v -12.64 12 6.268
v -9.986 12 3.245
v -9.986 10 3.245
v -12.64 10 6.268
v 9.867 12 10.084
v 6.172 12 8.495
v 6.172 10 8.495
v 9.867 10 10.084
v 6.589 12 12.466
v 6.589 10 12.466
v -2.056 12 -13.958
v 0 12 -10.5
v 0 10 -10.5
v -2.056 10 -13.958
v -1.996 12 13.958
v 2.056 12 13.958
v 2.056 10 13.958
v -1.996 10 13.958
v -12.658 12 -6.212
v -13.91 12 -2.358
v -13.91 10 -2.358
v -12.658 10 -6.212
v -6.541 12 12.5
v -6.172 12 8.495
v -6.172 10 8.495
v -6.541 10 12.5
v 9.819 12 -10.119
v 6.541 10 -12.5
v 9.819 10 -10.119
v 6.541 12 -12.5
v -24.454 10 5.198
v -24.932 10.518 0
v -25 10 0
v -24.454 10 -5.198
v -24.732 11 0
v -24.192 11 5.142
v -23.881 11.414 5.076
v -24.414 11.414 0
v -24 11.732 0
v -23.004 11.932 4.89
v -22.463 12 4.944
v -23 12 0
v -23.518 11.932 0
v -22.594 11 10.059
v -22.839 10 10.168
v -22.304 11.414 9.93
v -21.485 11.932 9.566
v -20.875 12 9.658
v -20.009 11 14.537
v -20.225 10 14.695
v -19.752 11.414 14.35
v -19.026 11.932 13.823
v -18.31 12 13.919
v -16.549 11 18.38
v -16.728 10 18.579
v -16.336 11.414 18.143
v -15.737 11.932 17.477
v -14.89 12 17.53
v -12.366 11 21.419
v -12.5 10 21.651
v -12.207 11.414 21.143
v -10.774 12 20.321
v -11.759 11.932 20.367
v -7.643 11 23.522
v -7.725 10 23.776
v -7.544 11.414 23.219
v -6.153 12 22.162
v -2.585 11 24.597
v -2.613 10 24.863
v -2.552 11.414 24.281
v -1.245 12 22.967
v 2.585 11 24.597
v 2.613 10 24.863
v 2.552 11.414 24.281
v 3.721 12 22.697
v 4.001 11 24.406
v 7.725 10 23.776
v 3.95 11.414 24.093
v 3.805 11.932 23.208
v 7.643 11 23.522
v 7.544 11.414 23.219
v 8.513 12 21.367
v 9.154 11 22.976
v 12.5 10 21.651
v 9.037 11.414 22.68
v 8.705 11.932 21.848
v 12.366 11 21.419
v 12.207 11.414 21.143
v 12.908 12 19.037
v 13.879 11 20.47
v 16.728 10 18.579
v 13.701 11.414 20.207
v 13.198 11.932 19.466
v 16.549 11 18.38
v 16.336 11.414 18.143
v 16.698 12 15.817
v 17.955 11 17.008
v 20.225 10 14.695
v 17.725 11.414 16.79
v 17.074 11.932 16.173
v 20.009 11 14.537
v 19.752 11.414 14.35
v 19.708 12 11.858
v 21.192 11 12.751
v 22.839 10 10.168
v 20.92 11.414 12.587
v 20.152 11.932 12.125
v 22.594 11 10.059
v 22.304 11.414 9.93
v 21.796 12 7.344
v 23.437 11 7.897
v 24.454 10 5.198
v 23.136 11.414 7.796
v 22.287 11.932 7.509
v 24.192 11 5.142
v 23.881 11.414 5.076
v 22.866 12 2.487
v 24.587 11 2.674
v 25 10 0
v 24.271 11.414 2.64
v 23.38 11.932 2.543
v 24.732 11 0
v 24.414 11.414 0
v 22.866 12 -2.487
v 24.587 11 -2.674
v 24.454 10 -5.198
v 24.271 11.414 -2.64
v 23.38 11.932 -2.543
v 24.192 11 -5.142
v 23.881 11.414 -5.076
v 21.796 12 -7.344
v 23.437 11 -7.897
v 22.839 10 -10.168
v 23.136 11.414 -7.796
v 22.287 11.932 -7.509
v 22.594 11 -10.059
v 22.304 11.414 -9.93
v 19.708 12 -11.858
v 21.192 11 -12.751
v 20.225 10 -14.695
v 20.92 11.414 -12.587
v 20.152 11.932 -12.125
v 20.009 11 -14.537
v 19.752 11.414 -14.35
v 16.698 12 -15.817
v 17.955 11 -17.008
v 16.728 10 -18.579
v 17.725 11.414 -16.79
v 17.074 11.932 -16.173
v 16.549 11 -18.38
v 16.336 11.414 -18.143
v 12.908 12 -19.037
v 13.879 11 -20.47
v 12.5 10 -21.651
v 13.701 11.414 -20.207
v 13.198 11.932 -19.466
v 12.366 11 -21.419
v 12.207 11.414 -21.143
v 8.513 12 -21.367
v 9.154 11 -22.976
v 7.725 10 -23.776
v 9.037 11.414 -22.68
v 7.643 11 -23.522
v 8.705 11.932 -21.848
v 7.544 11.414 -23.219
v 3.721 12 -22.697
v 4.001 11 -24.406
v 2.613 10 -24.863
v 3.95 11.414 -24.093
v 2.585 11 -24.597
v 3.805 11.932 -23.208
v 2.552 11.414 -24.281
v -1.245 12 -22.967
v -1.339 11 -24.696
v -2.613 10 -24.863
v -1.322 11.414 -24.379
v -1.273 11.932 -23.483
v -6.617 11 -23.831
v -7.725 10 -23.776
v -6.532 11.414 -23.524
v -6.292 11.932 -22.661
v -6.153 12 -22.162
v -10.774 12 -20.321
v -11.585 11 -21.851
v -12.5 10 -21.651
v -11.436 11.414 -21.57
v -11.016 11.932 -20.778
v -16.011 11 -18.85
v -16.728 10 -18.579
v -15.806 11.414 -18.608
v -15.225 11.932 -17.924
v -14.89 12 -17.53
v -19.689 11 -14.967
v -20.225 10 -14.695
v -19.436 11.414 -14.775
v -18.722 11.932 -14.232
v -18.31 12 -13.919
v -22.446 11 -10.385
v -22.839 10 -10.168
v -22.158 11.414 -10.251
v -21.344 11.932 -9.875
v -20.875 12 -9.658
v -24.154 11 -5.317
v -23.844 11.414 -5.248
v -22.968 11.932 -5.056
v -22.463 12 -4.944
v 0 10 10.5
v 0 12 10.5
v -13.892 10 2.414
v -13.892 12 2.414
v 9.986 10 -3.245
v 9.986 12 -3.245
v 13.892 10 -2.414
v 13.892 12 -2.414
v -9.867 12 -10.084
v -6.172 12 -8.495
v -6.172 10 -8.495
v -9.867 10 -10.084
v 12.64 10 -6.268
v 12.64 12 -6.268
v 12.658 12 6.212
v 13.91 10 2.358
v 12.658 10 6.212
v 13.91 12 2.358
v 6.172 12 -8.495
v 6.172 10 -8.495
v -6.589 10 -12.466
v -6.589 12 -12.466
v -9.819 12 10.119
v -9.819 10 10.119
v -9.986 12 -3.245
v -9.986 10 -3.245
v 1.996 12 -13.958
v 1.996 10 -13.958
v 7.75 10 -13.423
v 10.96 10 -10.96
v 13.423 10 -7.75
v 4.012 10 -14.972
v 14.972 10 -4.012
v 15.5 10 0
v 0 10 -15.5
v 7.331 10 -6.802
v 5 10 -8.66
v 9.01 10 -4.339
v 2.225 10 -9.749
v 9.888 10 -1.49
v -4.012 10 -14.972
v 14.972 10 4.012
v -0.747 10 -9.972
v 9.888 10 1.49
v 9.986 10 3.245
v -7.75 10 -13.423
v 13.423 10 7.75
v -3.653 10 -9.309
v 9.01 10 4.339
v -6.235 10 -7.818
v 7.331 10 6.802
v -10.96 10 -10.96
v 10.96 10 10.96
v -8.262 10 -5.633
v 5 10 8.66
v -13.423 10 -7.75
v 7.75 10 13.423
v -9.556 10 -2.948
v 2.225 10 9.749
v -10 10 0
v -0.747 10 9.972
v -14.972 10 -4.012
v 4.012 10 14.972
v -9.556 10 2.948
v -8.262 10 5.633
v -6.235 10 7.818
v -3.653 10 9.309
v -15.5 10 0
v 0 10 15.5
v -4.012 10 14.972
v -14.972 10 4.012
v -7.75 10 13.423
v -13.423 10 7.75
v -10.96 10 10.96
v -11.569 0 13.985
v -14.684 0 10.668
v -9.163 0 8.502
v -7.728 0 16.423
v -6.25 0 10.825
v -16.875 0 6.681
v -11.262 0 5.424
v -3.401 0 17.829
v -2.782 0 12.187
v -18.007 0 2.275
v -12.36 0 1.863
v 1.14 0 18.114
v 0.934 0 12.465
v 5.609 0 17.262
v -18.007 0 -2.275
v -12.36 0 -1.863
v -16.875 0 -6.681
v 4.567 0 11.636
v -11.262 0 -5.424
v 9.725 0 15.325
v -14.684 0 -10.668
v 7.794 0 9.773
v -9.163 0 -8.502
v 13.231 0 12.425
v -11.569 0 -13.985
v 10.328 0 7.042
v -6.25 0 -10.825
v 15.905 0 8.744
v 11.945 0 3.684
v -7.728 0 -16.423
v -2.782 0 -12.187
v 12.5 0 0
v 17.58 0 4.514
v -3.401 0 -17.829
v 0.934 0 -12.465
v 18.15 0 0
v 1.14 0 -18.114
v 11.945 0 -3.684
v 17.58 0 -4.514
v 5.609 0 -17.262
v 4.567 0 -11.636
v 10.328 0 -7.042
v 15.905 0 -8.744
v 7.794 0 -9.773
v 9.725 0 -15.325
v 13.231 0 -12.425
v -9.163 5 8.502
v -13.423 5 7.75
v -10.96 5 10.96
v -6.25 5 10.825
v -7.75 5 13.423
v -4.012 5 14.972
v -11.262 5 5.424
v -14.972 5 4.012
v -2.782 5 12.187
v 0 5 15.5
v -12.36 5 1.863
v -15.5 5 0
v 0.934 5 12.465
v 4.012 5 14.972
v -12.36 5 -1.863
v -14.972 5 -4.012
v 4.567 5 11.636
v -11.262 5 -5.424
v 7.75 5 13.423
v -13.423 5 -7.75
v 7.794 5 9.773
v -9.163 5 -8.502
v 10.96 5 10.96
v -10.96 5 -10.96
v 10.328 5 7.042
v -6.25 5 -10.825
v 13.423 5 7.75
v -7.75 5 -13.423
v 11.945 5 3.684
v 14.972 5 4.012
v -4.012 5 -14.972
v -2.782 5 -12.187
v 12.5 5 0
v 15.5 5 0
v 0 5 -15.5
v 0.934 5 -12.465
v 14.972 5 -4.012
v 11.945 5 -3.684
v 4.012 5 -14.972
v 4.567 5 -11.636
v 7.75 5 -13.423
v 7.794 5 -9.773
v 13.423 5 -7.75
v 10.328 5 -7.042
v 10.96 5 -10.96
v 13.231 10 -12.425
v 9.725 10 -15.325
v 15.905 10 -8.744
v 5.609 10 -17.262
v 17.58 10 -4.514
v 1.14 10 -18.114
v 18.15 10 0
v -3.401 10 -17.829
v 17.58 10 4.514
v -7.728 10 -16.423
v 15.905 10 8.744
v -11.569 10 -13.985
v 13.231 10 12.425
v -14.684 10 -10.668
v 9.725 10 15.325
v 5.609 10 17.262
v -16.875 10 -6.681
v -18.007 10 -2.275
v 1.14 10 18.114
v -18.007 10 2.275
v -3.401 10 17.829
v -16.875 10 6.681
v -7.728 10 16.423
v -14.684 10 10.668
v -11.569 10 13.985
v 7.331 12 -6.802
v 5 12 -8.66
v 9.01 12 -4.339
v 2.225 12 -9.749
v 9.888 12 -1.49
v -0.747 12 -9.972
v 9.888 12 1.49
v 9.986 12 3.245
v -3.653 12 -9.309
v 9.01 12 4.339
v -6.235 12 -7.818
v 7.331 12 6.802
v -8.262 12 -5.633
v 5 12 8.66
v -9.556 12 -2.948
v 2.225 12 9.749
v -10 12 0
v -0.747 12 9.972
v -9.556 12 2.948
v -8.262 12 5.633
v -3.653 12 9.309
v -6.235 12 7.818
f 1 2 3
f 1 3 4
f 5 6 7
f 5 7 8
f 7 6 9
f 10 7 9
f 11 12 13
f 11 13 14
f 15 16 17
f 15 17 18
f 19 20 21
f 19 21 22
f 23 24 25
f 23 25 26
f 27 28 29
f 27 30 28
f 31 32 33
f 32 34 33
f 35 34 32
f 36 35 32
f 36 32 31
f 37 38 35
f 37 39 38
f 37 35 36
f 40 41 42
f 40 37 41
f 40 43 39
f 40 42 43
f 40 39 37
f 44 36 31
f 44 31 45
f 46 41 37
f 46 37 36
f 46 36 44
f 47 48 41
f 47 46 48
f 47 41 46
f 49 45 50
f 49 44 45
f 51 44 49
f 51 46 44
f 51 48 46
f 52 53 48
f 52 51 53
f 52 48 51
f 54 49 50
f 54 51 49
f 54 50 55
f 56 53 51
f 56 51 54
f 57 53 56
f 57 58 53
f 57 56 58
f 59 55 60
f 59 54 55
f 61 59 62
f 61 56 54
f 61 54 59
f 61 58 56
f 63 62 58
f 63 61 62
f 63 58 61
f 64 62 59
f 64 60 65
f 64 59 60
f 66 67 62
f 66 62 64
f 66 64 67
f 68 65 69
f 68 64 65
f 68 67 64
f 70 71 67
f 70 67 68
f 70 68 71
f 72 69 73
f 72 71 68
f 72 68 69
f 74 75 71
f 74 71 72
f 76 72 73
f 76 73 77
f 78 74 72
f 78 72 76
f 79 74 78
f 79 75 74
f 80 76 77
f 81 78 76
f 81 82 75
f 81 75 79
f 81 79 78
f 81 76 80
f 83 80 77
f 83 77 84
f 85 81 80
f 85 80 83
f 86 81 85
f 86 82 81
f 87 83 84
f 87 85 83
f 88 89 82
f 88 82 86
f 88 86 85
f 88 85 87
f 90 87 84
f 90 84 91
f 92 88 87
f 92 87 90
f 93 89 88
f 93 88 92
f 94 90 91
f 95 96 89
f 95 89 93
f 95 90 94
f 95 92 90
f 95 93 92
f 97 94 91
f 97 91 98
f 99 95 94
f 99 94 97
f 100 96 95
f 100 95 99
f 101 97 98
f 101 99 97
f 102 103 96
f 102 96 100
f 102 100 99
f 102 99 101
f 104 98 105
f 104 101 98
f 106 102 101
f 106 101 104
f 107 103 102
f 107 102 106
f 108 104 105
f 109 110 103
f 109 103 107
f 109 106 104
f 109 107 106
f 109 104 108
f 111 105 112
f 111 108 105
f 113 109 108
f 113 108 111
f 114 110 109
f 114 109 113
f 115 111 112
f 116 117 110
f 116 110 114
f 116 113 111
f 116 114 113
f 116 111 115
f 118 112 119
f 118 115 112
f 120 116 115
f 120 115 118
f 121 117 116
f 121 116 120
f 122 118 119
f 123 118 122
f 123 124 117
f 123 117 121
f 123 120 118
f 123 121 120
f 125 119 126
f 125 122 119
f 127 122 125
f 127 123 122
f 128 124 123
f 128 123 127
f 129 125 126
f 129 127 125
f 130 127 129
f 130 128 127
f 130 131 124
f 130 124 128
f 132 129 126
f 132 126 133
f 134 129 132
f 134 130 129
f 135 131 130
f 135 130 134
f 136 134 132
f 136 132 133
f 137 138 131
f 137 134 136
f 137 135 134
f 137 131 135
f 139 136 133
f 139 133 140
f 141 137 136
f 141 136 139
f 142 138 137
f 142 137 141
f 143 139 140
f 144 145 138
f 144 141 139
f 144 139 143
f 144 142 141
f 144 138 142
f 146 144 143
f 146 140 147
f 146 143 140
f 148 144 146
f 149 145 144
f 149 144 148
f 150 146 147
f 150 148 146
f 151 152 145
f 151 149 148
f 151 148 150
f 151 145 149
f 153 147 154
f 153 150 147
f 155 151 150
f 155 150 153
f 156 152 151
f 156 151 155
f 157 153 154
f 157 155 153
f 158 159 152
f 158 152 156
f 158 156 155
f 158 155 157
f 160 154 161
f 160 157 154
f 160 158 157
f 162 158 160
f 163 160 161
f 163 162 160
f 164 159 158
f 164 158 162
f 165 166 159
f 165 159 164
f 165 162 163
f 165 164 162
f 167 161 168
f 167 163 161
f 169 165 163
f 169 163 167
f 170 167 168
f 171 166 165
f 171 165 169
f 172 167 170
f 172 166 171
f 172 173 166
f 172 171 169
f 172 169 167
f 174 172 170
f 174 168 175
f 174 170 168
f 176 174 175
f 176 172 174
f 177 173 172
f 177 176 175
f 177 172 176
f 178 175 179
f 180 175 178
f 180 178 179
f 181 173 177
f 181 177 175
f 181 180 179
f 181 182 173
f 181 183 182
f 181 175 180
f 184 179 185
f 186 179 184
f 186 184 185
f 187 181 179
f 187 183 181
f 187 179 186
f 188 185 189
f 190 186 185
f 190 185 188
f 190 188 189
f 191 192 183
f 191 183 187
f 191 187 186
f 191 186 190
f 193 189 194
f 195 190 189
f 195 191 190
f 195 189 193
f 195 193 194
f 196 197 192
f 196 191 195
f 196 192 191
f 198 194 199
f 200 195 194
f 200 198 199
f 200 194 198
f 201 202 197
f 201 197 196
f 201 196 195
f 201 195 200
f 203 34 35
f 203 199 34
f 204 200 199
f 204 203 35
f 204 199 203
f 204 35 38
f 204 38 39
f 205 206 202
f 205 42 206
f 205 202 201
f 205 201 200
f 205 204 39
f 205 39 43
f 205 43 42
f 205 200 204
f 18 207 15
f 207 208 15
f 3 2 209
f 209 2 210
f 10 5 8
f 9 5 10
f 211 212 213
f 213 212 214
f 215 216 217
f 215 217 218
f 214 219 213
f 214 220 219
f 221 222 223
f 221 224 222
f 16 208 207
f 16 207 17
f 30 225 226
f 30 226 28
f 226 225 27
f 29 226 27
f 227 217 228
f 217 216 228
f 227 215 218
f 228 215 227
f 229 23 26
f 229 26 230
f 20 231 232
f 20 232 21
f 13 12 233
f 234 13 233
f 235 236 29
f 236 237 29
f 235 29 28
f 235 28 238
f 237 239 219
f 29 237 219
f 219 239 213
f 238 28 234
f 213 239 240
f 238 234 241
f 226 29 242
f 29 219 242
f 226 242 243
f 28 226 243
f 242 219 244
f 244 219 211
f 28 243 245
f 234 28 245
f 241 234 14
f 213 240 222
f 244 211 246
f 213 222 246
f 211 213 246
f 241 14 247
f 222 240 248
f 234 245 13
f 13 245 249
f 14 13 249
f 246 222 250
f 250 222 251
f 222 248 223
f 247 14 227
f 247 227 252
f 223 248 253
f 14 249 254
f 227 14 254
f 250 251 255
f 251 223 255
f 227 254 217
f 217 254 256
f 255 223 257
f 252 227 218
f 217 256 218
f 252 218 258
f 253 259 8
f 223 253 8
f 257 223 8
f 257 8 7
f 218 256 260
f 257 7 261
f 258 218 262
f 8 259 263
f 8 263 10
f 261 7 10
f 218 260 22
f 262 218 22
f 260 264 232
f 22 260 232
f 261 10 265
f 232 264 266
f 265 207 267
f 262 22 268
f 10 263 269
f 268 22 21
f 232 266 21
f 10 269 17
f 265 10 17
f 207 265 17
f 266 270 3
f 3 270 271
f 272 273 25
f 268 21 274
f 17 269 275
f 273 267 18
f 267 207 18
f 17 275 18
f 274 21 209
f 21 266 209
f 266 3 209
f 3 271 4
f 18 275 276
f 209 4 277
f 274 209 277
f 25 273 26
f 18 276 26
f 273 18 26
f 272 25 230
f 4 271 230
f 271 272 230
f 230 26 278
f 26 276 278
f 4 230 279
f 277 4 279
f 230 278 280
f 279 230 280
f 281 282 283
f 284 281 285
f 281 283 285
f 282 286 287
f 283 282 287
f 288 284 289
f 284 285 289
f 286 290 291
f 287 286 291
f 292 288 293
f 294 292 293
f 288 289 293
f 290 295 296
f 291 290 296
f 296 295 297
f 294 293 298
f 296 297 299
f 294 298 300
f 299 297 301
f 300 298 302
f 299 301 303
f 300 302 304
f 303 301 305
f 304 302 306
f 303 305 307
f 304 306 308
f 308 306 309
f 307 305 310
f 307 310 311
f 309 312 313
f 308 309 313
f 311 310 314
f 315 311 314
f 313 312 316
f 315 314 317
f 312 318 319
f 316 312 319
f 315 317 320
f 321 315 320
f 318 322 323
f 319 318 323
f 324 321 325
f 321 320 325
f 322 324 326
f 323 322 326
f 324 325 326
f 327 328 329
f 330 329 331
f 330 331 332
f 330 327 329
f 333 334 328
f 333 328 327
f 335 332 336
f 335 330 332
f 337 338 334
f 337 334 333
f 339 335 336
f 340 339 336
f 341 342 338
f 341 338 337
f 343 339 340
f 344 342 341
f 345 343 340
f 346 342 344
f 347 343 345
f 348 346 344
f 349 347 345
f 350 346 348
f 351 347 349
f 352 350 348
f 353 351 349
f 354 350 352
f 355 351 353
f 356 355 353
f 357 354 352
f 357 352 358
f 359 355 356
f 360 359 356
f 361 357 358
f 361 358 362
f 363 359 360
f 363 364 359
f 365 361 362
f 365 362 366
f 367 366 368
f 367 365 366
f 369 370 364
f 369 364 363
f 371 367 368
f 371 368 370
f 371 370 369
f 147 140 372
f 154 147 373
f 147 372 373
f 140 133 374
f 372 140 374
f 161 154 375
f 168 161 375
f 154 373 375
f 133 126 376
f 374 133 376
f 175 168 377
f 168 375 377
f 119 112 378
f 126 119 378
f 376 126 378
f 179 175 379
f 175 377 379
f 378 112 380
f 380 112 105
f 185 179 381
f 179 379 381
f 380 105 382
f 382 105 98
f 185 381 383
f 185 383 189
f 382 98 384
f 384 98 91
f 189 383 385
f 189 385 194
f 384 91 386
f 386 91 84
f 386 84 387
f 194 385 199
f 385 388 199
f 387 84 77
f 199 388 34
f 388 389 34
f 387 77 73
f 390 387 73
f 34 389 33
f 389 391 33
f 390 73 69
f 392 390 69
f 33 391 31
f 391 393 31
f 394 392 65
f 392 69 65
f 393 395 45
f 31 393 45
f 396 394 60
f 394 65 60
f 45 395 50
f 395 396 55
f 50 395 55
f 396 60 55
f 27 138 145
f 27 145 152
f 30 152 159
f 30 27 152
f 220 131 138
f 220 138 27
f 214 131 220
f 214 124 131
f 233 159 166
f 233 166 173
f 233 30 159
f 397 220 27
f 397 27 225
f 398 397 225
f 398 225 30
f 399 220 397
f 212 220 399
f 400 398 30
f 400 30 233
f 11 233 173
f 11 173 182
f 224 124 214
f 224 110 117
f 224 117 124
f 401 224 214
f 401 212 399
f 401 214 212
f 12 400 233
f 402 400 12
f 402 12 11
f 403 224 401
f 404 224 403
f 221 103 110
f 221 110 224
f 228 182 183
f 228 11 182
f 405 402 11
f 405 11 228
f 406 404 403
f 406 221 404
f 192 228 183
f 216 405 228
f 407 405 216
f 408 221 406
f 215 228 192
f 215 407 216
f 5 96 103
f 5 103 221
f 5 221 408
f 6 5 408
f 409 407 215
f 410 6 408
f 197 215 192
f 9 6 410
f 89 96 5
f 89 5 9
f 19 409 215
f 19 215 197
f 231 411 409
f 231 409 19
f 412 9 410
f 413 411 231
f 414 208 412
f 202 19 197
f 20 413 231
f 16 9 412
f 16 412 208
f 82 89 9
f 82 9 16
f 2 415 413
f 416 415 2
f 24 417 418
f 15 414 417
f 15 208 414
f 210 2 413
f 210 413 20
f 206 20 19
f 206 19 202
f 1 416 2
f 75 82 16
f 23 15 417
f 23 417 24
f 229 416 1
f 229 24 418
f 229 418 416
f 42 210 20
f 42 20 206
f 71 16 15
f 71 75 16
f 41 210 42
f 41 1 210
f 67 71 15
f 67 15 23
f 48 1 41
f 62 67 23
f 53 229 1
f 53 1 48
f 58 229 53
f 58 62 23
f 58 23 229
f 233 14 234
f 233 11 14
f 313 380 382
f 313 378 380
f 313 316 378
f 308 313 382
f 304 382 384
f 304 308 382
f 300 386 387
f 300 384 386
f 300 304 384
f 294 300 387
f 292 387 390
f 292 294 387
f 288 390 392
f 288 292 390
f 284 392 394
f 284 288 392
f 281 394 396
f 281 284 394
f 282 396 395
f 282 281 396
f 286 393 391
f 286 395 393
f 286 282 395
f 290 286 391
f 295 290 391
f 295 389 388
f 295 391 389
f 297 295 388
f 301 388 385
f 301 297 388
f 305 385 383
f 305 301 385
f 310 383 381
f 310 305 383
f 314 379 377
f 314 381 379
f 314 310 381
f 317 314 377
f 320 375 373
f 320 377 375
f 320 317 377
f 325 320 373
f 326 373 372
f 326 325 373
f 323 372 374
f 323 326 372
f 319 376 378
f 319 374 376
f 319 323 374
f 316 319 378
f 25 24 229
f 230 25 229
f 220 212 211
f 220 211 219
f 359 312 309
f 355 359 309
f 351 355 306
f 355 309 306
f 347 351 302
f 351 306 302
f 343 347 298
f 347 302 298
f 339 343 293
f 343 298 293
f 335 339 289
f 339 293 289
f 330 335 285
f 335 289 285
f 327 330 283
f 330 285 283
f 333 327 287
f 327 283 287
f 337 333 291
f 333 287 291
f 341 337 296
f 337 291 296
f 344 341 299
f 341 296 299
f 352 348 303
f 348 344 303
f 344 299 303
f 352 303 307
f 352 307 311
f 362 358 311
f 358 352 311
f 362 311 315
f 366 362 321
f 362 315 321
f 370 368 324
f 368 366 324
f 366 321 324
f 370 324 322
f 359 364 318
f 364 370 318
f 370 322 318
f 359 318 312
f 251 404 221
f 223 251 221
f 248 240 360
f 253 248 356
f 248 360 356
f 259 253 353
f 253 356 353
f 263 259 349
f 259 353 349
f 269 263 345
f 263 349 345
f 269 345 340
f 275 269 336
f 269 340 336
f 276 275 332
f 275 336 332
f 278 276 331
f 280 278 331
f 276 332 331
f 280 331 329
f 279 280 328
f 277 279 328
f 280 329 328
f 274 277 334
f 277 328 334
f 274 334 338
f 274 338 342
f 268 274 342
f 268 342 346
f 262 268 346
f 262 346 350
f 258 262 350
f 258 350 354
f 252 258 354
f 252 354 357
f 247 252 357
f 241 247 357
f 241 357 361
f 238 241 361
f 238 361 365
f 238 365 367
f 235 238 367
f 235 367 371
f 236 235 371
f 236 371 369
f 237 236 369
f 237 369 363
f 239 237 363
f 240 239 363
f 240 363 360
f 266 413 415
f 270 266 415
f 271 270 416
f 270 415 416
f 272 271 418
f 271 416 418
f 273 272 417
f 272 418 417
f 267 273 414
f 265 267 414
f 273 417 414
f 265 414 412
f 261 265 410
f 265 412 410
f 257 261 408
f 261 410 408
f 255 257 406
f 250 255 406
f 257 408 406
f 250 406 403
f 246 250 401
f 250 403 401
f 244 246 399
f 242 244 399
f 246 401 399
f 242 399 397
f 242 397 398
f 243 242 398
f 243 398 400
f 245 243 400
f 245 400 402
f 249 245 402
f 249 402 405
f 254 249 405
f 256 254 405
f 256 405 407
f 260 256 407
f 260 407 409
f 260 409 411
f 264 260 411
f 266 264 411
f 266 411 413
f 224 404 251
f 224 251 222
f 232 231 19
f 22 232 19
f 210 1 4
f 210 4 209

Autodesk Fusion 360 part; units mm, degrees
sketch "Esquisse1" plane through (0, 0, 0) normal (0, 1, 0) x (1, 0, 0)
  circle A0 centre (0, 0) radius 18.15
  circle A1 centre (0, 0) radius 15.5
  dimension "d1" = 36.3
  dimension "d2" = 31
extrude "Extrusion1" add sketch "Esquisse1" along normal blind 10 makes body 1
sketch "Esquisse2" plane through (0, 10, 0) normal (0, 1, 0) x (-1, 0, 0)
  circle A0 centre (0, 0) radius 15.5
  circle A1 centre (0, 0) radius 18.15
  circle A2 centre (0, 0) radius 25
  dimension "d5" = 50
extrude "Extrusion2" add sketch "Esquisse2" along normal blind 2 contours A1 | A2 bodies 1
sketch "Esquisse3" plane through (0, 0, 0) normal (0, 1, 0) x (1, 0, 0)
  circle A0 centre (0, 0) radius 16.65
  circle A1 centre (0, 0) radius 12.5
  dimension "d8" = 33.3
  dimension "d9" = 25
extrude "Extrusion3" add sketch "Esquisse3" along normal blind 5 bodies 1
sketch "Esquisse4" plane through (0, 12, 0) normal (0, 1, 0) x (-1, 0, 0)
  circle A0 centre (0, 0) radius 15.5
  circle A1 centre (0, 0) radius 25
  circle A2 centre (0, 0) radius 16.65
  circle A3 centre (0, 0) radius 10
  dimension "d12" = 33.3
  dimension "d13" = 20
extrude "Extrusion4" add sketch "Esquisse4" against normal blind 2 separate body contours A0 makes body 2
fillet "Congé1" radius 2 1 edges at (23.3082, 12, -9.0404) on bodies 1
sketch "Esquisse5" plane through (0, 12, 0) normal (0, 1, 0) x (-1, 0, 0)
  circle A0 centre (0, 0) radius 10
  circle A1 centre (0, 0) radius 15.5
  line L0 (0, 10.5) -> (1.9964, 13.9579)
  line L1 (0, 10.5) -> (3.9928, 10.5) construction
  line L2 (0, 10.5) -> (-2.0557, 13.9579)
  line L3 (-2.0557, 13.9579) -> (1.9964, 13.9579)
  line L4 (-6.1717, 8.4947) -> (-6.5891, 12.4657)
  line L5 (-9.8673, 10.0839) -> (-6.5891, 12.4657)
  line L6 (-6.1717, 8.4947) -> (-9.8673, 10.0839)
  line L7 (-9.9861, 3.2447) -> (-12.6578, 6.2119)
  line L8 (-13.91, 2.3582) -> (-12.6578, 6.2119)
  line L9 (-9.9861, 3.2447) -> (-13.91, 2.3582)
  line L10 (-9.9861, -3.2447) -> (-13.8917, -2.4145)
  line L11 (-12.6395, -6.2683) -> (-13.8917, -2.4145)
  line L12 (-9.9861, -3.2447) -> (-12.6395, -6.2683)
  line L13 (-6.1717, -8.4947) -> (-9.8194, -10.1187)
  line L14 (-6.5412, -12.5005) -> (-9.8194, -10.1187)
  line L15 (-6.1717, -8.4947) -> (-6.5412, -12.5005)
  line L16 (0, -10.5) -> (-1.9964, -13.9579)
  line L17 (2.0557, -13.9579) -> (-1.9964, -13.9579)
  line L18 (0, -10.5) -> (2.0557, -13.9579)
  line L19 (6.1717, -8.4947) -> (6.5891, -12.4657)
  line L20 (9.8673, -10.0839) -> (6.5891, -12.4657)
  line L21 (6.1717, -8.4947) -> (9.8673, -10.0839)
  line L22 (9.9861, -3.2447) -> (12.6578, -6.2119)
  line L23 (13.91, -2.3582) -> (12.6578, -6.2119)
  line L24 (9.9861, -3.2447) -> (13.91, -2.3582)
  line L25 (9.9861, 3.2447) -> (13.8917, 2.4145)
  line L26 (12.6395, 6.2683) -> (13.8917, 2.4145)
  line L27 (9.9861, 3.2447) -> (12.6395, 6.2683)
  line L28 (6.1717, 8.4947) -> (9.8194, 10.1187)
  line L29 (6.5412, 12.5005) -> (9.8194, 10.1187)
  line L30 (6.1717, 8.4947) -> (6.5412, 12.5005)
  dimension "d18" = 60
  dimension "d20" = 360
extrude "Extrusion5" cut sketch "Esquisse5" against normal blind 5 contours L0 L2 L3 | L4 L5 L6 | L7 L8 L9 | L10 L11 L12 | L13 L14 L15 | L16 L17 L18 | L19 L20 L21 | L22 L23 L24 | L25 L26 L27 | L28 L29 L30 bodies 2
combine "Combiner1" operation add target body 1 tool bodies 2
